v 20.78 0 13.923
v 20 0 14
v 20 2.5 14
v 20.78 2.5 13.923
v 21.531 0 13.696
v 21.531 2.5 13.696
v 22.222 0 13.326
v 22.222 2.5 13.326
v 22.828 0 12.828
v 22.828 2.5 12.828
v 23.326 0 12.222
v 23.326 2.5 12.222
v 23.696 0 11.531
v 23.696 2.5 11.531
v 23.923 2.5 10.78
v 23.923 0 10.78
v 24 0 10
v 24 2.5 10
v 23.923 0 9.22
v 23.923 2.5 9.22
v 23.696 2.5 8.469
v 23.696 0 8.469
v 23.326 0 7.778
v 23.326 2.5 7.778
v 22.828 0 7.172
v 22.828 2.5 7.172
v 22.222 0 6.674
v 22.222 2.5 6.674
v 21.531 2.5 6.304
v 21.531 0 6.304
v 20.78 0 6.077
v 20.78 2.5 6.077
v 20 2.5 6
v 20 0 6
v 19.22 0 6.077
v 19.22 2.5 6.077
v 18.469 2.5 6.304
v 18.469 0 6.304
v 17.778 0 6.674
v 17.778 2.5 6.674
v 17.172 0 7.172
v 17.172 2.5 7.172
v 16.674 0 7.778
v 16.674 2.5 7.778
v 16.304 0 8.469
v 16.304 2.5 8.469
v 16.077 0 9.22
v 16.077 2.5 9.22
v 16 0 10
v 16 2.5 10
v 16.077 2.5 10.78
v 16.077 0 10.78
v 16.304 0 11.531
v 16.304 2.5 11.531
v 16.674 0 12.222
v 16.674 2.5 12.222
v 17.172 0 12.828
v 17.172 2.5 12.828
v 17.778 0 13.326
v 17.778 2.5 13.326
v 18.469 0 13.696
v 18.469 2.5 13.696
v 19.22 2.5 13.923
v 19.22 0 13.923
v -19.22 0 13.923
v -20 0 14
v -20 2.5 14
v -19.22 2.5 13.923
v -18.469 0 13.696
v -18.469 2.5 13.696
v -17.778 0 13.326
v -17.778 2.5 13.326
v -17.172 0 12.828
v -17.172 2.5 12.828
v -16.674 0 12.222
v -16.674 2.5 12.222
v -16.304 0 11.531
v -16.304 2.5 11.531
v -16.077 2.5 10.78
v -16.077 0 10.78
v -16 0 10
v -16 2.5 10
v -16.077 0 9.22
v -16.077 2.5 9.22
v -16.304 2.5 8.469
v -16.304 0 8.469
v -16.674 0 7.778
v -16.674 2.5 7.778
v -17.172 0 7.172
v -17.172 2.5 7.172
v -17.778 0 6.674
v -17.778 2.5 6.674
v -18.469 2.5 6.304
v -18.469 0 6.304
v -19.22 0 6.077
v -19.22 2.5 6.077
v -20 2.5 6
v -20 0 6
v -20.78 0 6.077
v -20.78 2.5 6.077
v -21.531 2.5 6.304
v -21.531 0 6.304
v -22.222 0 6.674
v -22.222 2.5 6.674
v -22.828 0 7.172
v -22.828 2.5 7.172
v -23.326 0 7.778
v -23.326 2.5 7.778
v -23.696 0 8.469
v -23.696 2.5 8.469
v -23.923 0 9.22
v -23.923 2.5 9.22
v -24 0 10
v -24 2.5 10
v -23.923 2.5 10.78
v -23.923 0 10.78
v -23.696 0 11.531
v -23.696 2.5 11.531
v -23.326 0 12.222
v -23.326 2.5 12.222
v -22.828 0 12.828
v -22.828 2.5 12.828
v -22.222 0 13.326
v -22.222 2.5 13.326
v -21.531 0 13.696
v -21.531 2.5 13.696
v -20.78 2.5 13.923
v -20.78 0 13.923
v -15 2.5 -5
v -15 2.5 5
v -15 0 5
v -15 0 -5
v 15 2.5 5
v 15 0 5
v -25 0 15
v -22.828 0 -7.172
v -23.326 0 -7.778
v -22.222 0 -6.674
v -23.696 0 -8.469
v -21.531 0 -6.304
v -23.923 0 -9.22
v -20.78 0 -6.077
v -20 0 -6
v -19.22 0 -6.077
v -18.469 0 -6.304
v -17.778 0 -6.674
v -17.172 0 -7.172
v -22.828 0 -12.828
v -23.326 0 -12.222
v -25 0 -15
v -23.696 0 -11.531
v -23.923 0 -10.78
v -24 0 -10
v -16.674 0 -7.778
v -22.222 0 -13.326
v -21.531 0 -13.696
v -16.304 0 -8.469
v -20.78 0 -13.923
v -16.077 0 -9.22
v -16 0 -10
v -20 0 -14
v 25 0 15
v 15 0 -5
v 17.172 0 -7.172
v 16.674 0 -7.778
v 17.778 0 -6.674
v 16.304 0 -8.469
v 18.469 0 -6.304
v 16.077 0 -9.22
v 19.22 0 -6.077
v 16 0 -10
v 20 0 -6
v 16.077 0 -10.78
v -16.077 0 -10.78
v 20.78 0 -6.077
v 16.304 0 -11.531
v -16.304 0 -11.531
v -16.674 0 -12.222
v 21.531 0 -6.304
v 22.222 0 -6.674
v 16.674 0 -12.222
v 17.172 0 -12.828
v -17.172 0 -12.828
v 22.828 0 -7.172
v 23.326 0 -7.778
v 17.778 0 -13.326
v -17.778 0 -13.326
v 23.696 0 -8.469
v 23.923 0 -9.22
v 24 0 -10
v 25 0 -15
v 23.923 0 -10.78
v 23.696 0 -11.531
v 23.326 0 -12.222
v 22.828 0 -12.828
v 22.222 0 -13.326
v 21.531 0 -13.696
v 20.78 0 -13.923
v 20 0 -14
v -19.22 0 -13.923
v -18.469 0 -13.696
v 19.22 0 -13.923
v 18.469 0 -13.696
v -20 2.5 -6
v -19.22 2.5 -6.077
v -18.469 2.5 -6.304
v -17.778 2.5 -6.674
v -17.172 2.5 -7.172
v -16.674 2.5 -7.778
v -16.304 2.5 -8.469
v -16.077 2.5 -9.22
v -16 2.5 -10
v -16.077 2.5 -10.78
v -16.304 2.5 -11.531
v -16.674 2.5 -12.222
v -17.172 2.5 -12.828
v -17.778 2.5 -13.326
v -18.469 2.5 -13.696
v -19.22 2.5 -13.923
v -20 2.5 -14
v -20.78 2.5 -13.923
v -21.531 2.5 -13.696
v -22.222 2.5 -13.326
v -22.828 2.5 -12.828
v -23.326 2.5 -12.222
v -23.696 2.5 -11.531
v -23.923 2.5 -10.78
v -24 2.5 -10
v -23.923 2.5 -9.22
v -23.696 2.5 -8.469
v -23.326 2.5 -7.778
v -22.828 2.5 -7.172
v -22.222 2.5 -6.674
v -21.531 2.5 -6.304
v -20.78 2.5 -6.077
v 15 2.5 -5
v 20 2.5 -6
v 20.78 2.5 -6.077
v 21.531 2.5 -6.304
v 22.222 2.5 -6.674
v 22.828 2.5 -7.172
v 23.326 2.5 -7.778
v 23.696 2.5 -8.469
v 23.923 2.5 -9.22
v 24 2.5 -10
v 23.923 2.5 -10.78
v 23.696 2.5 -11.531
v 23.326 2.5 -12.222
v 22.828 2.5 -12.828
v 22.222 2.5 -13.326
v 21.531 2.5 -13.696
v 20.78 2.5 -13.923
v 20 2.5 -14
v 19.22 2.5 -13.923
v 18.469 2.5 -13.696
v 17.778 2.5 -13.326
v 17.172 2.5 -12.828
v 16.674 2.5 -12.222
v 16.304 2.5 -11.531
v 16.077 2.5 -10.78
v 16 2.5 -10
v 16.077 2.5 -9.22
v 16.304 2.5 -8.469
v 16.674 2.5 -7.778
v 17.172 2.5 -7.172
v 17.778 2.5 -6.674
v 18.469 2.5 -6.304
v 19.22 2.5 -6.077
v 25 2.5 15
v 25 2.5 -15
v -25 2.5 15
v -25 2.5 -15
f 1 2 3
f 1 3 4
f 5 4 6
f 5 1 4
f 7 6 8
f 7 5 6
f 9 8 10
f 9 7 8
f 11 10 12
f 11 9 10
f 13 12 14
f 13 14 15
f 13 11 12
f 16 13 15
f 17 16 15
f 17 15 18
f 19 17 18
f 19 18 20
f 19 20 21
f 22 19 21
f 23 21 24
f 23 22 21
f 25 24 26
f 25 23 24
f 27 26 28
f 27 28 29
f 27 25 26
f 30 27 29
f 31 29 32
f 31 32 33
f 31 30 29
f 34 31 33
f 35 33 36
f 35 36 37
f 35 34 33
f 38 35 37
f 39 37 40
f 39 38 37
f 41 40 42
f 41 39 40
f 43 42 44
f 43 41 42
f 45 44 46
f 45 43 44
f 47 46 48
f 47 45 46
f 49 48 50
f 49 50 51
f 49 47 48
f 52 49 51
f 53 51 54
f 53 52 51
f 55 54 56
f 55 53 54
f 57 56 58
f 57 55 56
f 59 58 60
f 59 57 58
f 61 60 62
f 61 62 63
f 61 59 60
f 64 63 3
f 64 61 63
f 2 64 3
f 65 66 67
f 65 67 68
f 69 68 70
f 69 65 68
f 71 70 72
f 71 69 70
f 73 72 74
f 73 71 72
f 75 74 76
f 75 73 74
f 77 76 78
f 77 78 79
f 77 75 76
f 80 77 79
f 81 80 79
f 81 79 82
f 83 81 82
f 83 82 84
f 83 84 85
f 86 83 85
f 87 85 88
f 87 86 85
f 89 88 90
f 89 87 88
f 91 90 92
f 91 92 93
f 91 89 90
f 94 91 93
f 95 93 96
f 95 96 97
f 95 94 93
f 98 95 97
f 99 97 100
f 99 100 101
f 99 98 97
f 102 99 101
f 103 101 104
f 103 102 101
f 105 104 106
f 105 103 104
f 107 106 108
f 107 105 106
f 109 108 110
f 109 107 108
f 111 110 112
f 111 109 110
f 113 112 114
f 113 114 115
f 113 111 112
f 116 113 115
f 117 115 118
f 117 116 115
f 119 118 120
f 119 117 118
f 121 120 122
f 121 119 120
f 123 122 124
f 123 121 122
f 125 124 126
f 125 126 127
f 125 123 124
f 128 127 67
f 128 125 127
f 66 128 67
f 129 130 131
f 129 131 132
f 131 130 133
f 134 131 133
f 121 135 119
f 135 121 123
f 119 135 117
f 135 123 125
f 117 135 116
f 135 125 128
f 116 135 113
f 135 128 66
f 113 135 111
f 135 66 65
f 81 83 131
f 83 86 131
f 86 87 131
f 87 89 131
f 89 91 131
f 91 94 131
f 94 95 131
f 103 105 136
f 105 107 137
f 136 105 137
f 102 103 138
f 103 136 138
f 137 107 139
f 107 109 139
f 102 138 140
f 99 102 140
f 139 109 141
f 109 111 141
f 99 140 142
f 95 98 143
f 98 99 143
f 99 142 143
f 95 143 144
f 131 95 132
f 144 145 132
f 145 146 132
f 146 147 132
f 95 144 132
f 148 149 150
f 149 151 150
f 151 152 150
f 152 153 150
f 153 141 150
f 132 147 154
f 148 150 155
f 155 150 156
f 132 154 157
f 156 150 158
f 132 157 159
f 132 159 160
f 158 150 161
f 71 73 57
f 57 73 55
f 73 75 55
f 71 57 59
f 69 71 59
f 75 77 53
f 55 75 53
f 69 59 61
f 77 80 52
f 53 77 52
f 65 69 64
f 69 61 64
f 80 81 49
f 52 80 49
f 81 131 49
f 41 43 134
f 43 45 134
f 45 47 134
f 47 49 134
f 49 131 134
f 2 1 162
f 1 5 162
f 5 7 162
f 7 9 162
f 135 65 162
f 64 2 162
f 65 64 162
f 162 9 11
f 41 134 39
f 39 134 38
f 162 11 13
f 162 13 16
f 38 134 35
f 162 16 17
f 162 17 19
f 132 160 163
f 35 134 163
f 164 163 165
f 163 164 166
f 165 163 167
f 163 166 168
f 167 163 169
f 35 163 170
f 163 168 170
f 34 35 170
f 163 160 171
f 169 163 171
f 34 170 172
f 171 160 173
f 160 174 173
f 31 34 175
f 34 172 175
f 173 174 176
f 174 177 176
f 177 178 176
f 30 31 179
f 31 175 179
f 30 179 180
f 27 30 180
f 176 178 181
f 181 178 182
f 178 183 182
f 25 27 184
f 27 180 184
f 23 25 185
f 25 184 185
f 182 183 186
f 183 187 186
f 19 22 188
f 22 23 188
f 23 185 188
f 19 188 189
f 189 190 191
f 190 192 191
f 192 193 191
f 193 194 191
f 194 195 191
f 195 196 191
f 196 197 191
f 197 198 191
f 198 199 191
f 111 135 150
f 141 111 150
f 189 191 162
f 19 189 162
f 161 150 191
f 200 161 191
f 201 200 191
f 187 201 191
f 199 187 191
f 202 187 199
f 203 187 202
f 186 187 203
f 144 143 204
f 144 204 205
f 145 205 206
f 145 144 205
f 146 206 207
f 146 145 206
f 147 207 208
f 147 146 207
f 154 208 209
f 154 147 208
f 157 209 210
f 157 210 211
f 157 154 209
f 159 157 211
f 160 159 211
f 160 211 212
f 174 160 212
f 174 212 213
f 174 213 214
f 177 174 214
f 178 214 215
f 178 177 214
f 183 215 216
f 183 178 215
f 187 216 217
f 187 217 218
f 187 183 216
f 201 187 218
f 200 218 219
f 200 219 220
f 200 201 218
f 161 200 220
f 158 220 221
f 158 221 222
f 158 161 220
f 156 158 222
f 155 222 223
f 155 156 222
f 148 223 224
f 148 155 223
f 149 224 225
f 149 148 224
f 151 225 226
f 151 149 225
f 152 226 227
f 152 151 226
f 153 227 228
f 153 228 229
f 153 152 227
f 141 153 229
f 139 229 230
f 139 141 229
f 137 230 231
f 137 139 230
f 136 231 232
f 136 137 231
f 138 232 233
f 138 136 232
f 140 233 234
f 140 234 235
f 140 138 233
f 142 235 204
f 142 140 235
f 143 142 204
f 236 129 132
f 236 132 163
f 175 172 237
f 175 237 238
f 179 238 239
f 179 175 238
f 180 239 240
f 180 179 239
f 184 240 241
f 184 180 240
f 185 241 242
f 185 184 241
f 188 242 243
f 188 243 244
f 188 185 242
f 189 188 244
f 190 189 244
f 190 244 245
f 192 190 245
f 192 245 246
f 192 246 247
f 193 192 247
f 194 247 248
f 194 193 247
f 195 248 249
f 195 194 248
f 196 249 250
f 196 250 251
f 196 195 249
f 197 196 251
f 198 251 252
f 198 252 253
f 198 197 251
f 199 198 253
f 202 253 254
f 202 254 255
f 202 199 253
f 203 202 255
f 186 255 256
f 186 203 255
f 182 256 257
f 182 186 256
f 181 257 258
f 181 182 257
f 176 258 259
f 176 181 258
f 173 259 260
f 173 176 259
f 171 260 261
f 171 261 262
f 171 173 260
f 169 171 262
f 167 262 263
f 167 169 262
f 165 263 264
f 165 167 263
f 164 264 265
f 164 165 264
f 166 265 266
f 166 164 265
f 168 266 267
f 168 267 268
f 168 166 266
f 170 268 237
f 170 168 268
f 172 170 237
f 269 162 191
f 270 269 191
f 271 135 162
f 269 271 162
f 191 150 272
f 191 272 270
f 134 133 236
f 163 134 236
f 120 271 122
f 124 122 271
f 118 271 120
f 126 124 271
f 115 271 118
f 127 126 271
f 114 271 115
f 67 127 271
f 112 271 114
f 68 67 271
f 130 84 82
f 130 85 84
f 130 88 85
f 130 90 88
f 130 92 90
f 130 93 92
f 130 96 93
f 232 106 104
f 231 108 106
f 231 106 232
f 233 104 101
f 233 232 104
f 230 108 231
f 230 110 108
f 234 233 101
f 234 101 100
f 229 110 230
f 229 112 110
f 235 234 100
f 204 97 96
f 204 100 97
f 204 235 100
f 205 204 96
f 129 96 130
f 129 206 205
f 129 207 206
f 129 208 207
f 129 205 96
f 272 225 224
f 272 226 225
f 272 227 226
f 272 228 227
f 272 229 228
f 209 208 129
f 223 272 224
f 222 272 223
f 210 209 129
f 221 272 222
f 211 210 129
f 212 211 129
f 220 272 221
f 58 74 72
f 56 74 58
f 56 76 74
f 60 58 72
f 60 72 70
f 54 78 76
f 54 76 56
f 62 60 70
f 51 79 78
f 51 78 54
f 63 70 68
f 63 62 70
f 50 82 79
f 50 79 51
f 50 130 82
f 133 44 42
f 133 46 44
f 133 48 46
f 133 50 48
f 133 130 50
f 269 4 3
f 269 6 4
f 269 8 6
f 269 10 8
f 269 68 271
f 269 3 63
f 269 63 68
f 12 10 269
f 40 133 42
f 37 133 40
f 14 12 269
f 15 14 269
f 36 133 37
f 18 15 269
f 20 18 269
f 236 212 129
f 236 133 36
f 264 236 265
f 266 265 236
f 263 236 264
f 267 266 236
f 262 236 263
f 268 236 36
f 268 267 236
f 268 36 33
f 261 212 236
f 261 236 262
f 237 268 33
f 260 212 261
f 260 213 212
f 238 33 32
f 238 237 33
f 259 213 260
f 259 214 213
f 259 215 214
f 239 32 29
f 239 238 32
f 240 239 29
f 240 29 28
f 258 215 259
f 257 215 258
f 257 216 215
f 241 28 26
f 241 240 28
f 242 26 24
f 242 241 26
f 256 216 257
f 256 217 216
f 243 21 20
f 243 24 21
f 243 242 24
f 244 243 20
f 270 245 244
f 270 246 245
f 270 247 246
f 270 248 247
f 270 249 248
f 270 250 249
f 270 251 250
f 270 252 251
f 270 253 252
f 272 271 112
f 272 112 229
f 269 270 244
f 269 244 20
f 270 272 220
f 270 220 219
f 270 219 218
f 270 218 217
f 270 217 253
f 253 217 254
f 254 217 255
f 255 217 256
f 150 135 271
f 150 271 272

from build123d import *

# Parameters (mm, degrees)
SKETCH2_W           = 50
SKETCH2_H           = 30
SKETCH2_R           = 4
BOSS_EXTRUDE1_DEPTH = 2.5
SKETCH3_W           = 30
SKETCH3_H           = 10
CUT_EXTRUDE1_DEPTH  = 5


with BuildPart() as part:
    # Sketch2 → Boss-Extrude1 (new body)
    with BuildSketch(Plane(origin=(0, 0, 0), x_dir=(1, 0, 0), z_dir=(0, 1, 0))):
        Rectangle(SKETCH2_W, SKETCH2_H)
        with Locations(Location((-20, -10, 0), (0, 0, 270))):
            Circle(SKETCH2_R, mode=Mode.SUBTRACT)
        with Locations(Location((20, -10, 0), (0, 0, 270))):
            Circle(SKETCH2_R, mode=Mode.SUBTRACT)
        with Locations(Location((20, 10, 0), (0, 0, 270))):
            Circle(SKETCH2_R, mode=Mode.SUBTRACT)
        with Locations(Location((-20, 10, 0), (0, 0, 270))):
            Circle(SKETCH2_R, mode=Mode.SUBTRACT)
    extrude(amount=BOSS_EXTRUDE1_DEPTH)

    # Sketch3 → Cut-Extrude1 (cut)
    with BuildSketch(Plane(origin=(0, 2.5, 0), x_dir=(1, 0, 0), z_dir=(0, 1, 0))):
        Rectangle(SKETCH3_W, SKETCH3_H)
    extrude(amount=-CUT_EXTRUDE1_DEPTH, mode=Mode.SUBTRACT)


solid = part.part
